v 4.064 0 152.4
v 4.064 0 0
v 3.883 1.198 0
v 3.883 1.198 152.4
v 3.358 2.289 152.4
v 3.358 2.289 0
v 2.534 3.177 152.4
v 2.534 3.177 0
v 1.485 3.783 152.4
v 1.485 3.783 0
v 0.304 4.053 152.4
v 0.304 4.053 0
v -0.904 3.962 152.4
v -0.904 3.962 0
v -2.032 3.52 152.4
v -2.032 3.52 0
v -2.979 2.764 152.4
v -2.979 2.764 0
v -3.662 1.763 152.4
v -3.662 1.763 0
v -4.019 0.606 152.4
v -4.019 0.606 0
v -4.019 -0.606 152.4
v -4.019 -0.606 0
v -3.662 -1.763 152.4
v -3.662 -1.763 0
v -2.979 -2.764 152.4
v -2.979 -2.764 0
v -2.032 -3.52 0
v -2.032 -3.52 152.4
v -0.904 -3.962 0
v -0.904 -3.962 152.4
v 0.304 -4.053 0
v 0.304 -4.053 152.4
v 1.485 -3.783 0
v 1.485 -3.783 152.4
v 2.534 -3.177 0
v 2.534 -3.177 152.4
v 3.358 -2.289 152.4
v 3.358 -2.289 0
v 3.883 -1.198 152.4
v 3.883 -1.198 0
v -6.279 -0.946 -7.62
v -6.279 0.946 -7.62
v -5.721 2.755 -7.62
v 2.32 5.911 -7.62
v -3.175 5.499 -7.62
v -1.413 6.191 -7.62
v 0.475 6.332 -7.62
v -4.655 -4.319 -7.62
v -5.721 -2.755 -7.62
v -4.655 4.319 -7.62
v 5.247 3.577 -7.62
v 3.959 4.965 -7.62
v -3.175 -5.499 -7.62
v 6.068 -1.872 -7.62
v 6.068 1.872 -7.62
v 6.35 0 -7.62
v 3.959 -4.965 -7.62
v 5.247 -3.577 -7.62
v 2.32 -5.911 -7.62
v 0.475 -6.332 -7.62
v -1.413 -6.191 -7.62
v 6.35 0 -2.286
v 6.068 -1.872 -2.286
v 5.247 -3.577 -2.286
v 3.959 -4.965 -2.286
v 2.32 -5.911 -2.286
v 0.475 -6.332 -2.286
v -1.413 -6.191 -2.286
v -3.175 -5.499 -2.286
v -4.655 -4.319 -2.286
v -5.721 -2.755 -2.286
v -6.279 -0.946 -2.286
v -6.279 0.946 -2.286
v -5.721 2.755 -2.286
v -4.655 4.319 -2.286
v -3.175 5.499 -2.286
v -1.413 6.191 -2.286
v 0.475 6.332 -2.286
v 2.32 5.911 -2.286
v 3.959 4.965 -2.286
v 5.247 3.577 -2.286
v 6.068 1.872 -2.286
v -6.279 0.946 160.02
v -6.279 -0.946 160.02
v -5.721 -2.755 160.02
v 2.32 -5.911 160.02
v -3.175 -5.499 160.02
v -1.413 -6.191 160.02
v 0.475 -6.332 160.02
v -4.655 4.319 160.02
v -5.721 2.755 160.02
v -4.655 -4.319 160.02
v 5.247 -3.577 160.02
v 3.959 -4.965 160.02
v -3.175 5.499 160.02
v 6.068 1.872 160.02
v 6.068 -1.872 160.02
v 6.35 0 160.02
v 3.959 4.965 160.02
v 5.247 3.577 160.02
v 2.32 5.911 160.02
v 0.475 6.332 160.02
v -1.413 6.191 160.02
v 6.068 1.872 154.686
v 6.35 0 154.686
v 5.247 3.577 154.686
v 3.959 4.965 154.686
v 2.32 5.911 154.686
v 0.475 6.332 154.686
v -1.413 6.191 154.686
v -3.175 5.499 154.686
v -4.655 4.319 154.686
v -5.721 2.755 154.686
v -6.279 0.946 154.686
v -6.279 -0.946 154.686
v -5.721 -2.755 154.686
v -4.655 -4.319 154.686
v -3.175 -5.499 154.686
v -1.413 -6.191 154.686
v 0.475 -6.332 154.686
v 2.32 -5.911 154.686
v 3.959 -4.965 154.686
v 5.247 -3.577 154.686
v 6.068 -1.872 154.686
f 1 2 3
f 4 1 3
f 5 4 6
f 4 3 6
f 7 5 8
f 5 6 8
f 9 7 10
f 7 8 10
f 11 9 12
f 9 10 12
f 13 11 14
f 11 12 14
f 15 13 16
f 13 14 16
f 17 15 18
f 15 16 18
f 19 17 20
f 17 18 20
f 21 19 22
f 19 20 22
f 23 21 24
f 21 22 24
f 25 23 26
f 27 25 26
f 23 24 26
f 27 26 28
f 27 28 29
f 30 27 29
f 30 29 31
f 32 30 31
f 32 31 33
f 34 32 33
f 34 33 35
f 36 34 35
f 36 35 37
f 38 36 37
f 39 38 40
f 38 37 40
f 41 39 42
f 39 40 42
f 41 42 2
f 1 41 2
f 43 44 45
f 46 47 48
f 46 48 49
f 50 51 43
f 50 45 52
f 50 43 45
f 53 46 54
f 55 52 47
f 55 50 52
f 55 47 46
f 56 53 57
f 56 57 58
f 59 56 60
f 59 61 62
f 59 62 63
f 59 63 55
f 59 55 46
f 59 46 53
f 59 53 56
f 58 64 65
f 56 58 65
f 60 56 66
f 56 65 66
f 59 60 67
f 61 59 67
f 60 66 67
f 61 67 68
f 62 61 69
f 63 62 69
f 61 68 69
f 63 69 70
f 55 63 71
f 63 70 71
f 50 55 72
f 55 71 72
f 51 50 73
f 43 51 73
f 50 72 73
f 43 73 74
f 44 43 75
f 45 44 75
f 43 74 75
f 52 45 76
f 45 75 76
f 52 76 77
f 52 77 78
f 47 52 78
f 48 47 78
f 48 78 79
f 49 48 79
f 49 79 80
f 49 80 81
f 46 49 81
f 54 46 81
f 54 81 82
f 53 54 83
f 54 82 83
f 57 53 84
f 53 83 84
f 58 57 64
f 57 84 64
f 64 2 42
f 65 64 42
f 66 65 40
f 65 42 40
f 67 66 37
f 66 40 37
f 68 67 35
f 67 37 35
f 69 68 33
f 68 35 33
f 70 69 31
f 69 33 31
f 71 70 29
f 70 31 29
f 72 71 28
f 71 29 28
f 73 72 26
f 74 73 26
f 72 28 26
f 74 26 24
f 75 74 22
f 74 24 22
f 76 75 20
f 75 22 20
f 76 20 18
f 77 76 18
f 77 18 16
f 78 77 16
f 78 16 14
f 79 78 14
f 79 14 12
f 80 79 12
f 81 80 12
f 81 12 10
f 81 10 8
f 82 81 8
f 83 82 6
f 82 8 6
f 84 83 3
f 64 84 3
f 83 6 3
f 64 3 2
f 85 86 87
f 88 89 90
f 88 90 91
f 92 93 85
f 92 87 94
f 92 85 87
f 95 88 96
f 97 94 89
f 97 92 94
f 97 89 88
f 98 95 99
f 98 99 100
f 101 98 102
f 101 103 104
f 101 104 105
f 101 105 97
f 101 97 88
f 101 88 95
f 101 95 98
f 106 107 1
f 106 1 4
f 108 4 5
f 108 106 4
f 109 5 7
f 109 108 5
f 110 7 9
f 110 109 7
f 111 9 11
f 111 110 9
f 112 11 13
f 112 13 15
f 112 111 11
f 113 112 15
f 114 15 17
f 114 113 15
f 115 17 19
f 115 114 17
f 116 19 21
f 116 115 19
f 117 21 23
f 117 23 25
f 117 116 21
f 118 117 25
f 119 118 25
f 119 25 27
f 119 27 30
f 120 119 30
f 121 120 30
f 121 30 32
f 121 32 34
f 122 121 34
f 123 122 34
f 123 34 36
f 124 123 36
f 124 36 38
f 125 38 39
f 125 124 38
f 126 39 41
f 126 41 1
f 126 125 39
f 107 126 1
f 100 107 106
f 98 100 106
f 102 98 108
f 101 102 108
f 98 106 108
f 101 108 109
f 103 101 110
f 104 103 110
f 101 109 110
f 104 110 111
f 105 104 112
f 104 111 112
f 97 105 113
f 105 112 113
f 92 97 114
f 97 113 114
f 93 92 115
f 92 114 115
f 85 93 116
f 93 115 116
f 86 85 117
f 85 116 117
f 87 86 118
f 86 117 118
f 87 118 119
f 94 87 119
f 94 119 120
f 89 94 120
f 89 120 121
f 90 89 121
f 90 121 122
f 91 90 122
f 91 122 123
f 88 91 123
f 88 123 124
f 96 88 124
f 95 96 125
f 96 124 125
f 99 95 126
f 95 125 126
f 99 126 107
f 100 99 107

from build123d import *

# Parameters (mm, degrees)
F0_R     = 4.064
F1_DEPTH = 152.4
F2_R     = 6.35
F2_R_2   = 4.064
F3_DEPTH = 7.62
F4_R     = 6.35
F4_R_2   = 4.064
F5_DEPTH = 7.62
F6_SIZE  = 2.28599


# Not quite as in the source:
# - a fillet or chamfer is up to 0.001 mm smaller than in the source, because OpenCascade refuses the exact size


with BuildPart() as f1:
    # F0 (on Top) → F1 (new body)
    with BuildSketch(Plane.XY):
        Circle(F0_R)
    extrude(amount=F1_DEPTH)

    # F2 (on face) → F3 (join)
    with BuildSketch(Plane.XY.offset(152.4)):
        Circle(F2_R)
        Circle(F2_R_2, mode=Mode.SUBTRACT)
        Circle(F2_R_2)
    extrude(amount=F3_DEPTH)

    # F4 (on face) → F5 (join)
    with BuildSketch(Plane(origin=(0, 0, 0), x_dir=(1, 0, 0), z_dir=(0, 0, -1))):
        Circle(F4_R)
        Circle(F4_R_2, mode=Mode.SUBTRACT)
        Circle(F4_R_2)
    extrude(amount=F5_DEPTH)

    # F6 (size 2.286 in the source; OpenCascade refuses exactly that, so slightly less here)
    f6_edges = [f1.edges().sort_by_distance(p)[0] for p in [
        (-6.35, 0, 0),
        (-6.35, 0, 152.4),
    ]]
    chamfer(f6_edges, length=F6_SIZE)


solid = f1.part
